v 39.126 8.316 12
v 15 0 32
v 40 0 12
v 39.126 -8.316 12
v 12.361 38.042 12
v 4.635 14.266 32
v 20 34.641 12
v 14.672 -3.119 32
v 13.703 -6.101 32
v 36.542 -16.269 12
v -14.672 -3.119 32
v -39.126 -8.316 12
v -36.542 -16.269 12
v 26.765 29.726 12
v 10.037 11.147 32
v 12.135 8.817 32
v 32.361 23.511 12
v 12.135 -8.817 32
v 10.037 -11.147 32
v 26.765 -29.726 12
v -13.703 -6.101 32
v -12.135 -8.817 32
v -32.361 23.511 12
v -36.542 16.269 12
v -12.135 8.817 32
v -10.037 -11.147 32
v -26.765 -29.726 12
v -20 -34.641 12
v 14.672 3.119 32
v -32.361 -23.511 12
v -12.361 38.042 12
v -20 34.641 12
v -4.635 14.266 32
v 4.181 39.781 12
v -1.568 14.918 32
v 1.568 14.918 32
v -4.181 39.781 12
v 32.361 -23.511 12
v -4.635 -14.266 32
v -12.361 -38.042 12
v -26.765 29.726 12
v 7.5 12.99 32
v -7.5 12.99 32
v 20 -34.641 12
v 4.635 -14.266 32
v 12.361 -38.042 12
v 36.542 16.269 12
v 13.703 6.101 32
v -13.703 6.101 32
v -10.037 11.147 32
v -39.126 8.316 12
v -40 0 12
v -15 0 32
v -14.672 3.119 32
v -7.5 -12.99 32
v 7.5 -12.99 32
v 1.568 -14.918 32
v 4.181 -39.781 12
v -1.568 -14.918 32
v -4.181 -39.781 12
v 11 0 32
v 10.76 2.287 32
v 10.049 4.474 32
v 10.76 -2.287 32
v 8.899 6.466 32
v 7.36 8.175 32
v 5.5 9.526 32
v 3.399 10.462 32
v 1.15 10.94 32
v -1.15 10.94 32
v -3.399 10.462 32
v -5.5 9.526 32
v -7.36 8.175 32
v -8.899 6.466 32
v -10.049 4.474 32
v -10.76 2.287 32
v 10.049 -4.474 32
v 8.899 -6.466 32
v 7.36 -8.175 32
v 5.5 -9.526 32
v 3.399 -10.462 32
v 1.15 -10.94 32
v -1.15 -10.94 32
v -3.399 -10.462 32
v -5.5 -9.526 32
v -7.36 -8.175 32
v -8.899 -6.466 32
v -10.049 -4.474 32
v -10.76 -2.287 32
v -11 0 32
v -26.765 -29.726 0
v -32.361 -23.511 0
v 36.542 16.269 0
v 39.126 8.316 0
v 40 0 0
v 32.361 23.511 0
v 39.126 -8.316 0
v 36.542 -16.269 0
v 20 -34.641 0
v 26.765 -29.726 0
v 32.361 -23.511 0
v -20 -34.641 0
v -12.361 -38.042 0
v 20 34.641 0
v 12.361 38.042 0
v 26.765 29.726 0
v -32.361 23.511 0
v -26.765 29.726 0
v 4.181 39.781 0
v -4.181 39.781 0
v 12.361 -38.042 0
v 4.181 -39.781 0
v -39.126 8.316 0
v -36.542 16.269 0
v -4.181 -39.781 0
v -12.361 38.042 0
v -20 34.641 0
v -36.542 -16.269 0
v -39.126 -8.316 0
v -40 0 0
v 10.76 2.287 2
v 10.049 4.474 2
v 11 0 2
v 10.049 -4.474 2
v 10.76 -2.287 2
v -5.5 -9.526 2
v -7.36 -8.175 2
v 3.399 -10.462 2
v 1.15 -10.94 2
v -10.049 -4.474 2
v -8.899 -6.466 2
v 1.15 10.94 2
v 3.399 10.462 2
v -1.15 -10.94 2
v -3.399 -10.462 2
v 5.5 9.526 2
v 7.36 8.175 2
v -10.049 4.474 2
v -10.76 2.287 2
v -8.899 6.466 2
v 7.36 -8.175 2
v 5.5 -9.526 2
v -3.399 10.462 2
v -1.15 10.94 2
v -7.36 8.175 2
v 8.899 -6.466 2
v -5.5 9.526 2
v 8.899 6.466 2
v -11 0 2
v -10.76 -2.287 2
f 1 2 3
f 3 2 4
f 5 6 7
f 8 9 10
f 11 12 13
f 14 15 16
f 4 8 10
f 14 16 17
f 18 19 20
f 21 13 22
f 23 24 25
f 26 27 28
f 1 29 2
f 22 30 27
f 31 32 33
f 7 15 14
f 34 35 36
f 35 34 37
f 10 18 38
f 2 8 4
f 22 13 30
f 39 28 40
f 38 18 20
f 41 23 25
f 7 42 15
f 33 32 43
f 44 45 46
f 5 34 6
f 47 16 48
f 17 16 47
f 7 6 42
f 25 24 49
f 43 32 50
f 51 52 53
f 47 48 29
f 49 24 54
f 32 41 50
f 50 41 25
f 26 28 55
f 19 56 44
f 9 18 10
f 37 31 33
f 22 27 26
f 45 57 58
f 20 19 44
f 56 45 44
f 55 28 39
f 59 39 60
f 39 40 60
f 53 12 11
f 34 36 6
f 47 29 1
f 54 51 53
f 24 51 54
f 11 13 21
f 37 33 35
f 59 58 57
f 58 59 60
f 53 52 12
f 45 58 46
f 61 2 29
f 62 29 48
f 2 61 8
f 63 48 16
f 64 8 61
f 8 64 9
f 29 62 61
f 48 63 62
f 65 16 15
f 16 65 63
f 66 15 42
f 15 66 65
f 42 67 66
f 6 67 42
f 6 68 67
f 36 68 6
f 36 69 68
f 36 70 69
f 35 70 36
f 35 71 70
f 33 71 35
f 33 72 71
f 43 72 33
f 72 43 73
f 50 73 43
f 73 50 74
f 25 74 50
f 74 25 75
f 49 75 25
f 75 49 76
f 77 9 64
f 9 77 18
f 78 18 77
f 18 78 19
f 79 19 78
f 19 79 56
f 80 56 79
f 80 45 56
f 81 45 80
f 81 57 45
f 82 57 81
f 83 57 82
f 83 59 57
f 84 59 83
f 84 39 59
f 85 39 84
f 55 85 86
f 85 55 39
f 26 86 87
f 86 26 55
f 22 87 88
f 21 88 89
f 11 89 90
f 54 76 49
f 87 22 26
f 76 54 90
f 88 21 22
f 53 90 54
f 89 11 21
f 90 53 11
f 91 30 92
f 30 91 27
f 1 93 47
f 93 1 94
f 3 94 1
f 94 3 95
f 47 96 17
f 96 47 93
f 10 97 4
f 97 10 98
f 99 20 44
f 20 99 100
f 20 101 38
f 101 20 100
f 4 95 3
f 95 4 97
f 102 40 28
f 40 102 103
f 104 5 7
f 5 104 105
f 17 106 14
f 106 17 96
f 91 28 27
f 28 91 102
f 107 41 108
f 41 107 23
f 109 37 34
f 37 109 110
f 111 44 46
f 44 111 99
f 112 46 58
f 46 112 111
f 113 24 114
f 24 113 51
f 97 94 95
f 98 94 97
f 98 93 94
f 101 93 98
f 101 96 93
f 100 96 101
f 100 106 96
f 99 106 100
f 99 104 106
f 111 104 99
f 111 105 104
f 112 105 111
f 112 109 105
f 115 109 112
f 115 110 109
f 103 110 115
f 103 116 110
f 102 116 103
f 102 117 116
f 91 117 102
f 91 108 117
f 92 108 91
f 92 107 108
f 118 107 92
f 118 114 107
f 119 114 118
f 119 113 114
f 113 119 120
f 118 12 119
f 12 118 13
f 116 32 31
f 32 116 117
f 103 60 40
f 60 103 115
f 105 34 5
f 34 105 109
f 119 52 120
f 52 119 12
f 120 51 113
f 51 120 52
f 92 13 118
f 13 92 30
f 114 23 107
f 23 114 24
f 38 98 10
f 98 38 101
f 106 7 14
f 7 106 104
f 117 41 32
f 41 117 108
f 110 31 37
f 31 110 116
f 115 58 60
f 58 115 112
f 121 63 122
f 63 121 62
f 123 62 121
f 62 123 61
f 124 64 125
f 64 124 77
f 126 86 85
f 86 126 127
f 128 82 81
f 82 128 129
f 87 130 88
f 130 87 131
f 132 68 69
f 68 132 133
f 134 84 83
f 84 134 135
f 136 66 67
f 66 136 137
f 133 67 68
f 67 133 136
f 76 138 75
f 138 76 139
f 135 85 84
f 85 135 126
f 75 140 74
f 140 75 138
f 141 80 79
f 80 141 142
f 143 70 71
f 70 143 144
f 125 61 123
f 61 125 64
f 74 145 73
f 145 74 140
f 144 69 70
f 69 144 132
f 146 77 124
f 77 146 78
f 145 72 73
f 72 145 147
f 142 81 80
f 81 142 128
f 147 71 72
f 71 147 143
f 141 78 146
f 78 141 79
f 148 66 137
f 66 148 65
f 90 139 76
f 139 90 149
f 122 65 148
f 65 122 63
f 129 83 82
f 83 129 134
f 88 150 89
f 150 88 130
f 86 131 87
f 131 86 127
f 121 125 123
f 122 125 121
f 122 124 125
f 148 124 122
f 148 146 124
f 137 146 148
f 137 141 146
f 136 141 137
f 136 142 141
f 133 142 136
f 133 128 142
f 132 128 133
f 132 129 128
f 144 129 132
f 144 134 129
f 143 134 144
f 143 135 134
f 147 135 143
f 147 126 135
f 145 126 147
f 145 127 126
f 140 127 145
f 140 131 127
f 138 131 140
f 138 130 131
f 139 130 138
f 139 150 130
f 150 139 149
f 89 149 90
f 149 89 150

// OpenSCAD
// file: common.scad
coin_small_diameter=30;
coin_big_diameter=36;
coin_height=3;

nut_diameter_inner = 6;
nut_diameter_outer = 8;

roller_diameter= 22;
roller_diameter_inner= 10;
roller_width = 8;
// main file
include <./common.scad>


tree_base_height= 32;
tree_base_height_bottom = 12;
tree_base_bottom_height= 2;

tree_base_radius = roller_diameter/2 + 4;
tree_base_radius_bottom = 40;

module tree_base(){
    difference(){
        union(){

            translate([0,0,tree_base_height_bottom])
            cylinder(h= tree_base_height - tree_base_height_bottom, r1 = tree_base_radius_bottom, r2 = tree_base_radius);

            cylinder(h= tree_base_height_bottom, r = tree_base_radius_bottom);
        }
        
        #
        translate([0,0,tree_base_bottom_height])
        cylinder(h=tree_base_height,d=  roller_diameter);
    }
}


tree_base();
